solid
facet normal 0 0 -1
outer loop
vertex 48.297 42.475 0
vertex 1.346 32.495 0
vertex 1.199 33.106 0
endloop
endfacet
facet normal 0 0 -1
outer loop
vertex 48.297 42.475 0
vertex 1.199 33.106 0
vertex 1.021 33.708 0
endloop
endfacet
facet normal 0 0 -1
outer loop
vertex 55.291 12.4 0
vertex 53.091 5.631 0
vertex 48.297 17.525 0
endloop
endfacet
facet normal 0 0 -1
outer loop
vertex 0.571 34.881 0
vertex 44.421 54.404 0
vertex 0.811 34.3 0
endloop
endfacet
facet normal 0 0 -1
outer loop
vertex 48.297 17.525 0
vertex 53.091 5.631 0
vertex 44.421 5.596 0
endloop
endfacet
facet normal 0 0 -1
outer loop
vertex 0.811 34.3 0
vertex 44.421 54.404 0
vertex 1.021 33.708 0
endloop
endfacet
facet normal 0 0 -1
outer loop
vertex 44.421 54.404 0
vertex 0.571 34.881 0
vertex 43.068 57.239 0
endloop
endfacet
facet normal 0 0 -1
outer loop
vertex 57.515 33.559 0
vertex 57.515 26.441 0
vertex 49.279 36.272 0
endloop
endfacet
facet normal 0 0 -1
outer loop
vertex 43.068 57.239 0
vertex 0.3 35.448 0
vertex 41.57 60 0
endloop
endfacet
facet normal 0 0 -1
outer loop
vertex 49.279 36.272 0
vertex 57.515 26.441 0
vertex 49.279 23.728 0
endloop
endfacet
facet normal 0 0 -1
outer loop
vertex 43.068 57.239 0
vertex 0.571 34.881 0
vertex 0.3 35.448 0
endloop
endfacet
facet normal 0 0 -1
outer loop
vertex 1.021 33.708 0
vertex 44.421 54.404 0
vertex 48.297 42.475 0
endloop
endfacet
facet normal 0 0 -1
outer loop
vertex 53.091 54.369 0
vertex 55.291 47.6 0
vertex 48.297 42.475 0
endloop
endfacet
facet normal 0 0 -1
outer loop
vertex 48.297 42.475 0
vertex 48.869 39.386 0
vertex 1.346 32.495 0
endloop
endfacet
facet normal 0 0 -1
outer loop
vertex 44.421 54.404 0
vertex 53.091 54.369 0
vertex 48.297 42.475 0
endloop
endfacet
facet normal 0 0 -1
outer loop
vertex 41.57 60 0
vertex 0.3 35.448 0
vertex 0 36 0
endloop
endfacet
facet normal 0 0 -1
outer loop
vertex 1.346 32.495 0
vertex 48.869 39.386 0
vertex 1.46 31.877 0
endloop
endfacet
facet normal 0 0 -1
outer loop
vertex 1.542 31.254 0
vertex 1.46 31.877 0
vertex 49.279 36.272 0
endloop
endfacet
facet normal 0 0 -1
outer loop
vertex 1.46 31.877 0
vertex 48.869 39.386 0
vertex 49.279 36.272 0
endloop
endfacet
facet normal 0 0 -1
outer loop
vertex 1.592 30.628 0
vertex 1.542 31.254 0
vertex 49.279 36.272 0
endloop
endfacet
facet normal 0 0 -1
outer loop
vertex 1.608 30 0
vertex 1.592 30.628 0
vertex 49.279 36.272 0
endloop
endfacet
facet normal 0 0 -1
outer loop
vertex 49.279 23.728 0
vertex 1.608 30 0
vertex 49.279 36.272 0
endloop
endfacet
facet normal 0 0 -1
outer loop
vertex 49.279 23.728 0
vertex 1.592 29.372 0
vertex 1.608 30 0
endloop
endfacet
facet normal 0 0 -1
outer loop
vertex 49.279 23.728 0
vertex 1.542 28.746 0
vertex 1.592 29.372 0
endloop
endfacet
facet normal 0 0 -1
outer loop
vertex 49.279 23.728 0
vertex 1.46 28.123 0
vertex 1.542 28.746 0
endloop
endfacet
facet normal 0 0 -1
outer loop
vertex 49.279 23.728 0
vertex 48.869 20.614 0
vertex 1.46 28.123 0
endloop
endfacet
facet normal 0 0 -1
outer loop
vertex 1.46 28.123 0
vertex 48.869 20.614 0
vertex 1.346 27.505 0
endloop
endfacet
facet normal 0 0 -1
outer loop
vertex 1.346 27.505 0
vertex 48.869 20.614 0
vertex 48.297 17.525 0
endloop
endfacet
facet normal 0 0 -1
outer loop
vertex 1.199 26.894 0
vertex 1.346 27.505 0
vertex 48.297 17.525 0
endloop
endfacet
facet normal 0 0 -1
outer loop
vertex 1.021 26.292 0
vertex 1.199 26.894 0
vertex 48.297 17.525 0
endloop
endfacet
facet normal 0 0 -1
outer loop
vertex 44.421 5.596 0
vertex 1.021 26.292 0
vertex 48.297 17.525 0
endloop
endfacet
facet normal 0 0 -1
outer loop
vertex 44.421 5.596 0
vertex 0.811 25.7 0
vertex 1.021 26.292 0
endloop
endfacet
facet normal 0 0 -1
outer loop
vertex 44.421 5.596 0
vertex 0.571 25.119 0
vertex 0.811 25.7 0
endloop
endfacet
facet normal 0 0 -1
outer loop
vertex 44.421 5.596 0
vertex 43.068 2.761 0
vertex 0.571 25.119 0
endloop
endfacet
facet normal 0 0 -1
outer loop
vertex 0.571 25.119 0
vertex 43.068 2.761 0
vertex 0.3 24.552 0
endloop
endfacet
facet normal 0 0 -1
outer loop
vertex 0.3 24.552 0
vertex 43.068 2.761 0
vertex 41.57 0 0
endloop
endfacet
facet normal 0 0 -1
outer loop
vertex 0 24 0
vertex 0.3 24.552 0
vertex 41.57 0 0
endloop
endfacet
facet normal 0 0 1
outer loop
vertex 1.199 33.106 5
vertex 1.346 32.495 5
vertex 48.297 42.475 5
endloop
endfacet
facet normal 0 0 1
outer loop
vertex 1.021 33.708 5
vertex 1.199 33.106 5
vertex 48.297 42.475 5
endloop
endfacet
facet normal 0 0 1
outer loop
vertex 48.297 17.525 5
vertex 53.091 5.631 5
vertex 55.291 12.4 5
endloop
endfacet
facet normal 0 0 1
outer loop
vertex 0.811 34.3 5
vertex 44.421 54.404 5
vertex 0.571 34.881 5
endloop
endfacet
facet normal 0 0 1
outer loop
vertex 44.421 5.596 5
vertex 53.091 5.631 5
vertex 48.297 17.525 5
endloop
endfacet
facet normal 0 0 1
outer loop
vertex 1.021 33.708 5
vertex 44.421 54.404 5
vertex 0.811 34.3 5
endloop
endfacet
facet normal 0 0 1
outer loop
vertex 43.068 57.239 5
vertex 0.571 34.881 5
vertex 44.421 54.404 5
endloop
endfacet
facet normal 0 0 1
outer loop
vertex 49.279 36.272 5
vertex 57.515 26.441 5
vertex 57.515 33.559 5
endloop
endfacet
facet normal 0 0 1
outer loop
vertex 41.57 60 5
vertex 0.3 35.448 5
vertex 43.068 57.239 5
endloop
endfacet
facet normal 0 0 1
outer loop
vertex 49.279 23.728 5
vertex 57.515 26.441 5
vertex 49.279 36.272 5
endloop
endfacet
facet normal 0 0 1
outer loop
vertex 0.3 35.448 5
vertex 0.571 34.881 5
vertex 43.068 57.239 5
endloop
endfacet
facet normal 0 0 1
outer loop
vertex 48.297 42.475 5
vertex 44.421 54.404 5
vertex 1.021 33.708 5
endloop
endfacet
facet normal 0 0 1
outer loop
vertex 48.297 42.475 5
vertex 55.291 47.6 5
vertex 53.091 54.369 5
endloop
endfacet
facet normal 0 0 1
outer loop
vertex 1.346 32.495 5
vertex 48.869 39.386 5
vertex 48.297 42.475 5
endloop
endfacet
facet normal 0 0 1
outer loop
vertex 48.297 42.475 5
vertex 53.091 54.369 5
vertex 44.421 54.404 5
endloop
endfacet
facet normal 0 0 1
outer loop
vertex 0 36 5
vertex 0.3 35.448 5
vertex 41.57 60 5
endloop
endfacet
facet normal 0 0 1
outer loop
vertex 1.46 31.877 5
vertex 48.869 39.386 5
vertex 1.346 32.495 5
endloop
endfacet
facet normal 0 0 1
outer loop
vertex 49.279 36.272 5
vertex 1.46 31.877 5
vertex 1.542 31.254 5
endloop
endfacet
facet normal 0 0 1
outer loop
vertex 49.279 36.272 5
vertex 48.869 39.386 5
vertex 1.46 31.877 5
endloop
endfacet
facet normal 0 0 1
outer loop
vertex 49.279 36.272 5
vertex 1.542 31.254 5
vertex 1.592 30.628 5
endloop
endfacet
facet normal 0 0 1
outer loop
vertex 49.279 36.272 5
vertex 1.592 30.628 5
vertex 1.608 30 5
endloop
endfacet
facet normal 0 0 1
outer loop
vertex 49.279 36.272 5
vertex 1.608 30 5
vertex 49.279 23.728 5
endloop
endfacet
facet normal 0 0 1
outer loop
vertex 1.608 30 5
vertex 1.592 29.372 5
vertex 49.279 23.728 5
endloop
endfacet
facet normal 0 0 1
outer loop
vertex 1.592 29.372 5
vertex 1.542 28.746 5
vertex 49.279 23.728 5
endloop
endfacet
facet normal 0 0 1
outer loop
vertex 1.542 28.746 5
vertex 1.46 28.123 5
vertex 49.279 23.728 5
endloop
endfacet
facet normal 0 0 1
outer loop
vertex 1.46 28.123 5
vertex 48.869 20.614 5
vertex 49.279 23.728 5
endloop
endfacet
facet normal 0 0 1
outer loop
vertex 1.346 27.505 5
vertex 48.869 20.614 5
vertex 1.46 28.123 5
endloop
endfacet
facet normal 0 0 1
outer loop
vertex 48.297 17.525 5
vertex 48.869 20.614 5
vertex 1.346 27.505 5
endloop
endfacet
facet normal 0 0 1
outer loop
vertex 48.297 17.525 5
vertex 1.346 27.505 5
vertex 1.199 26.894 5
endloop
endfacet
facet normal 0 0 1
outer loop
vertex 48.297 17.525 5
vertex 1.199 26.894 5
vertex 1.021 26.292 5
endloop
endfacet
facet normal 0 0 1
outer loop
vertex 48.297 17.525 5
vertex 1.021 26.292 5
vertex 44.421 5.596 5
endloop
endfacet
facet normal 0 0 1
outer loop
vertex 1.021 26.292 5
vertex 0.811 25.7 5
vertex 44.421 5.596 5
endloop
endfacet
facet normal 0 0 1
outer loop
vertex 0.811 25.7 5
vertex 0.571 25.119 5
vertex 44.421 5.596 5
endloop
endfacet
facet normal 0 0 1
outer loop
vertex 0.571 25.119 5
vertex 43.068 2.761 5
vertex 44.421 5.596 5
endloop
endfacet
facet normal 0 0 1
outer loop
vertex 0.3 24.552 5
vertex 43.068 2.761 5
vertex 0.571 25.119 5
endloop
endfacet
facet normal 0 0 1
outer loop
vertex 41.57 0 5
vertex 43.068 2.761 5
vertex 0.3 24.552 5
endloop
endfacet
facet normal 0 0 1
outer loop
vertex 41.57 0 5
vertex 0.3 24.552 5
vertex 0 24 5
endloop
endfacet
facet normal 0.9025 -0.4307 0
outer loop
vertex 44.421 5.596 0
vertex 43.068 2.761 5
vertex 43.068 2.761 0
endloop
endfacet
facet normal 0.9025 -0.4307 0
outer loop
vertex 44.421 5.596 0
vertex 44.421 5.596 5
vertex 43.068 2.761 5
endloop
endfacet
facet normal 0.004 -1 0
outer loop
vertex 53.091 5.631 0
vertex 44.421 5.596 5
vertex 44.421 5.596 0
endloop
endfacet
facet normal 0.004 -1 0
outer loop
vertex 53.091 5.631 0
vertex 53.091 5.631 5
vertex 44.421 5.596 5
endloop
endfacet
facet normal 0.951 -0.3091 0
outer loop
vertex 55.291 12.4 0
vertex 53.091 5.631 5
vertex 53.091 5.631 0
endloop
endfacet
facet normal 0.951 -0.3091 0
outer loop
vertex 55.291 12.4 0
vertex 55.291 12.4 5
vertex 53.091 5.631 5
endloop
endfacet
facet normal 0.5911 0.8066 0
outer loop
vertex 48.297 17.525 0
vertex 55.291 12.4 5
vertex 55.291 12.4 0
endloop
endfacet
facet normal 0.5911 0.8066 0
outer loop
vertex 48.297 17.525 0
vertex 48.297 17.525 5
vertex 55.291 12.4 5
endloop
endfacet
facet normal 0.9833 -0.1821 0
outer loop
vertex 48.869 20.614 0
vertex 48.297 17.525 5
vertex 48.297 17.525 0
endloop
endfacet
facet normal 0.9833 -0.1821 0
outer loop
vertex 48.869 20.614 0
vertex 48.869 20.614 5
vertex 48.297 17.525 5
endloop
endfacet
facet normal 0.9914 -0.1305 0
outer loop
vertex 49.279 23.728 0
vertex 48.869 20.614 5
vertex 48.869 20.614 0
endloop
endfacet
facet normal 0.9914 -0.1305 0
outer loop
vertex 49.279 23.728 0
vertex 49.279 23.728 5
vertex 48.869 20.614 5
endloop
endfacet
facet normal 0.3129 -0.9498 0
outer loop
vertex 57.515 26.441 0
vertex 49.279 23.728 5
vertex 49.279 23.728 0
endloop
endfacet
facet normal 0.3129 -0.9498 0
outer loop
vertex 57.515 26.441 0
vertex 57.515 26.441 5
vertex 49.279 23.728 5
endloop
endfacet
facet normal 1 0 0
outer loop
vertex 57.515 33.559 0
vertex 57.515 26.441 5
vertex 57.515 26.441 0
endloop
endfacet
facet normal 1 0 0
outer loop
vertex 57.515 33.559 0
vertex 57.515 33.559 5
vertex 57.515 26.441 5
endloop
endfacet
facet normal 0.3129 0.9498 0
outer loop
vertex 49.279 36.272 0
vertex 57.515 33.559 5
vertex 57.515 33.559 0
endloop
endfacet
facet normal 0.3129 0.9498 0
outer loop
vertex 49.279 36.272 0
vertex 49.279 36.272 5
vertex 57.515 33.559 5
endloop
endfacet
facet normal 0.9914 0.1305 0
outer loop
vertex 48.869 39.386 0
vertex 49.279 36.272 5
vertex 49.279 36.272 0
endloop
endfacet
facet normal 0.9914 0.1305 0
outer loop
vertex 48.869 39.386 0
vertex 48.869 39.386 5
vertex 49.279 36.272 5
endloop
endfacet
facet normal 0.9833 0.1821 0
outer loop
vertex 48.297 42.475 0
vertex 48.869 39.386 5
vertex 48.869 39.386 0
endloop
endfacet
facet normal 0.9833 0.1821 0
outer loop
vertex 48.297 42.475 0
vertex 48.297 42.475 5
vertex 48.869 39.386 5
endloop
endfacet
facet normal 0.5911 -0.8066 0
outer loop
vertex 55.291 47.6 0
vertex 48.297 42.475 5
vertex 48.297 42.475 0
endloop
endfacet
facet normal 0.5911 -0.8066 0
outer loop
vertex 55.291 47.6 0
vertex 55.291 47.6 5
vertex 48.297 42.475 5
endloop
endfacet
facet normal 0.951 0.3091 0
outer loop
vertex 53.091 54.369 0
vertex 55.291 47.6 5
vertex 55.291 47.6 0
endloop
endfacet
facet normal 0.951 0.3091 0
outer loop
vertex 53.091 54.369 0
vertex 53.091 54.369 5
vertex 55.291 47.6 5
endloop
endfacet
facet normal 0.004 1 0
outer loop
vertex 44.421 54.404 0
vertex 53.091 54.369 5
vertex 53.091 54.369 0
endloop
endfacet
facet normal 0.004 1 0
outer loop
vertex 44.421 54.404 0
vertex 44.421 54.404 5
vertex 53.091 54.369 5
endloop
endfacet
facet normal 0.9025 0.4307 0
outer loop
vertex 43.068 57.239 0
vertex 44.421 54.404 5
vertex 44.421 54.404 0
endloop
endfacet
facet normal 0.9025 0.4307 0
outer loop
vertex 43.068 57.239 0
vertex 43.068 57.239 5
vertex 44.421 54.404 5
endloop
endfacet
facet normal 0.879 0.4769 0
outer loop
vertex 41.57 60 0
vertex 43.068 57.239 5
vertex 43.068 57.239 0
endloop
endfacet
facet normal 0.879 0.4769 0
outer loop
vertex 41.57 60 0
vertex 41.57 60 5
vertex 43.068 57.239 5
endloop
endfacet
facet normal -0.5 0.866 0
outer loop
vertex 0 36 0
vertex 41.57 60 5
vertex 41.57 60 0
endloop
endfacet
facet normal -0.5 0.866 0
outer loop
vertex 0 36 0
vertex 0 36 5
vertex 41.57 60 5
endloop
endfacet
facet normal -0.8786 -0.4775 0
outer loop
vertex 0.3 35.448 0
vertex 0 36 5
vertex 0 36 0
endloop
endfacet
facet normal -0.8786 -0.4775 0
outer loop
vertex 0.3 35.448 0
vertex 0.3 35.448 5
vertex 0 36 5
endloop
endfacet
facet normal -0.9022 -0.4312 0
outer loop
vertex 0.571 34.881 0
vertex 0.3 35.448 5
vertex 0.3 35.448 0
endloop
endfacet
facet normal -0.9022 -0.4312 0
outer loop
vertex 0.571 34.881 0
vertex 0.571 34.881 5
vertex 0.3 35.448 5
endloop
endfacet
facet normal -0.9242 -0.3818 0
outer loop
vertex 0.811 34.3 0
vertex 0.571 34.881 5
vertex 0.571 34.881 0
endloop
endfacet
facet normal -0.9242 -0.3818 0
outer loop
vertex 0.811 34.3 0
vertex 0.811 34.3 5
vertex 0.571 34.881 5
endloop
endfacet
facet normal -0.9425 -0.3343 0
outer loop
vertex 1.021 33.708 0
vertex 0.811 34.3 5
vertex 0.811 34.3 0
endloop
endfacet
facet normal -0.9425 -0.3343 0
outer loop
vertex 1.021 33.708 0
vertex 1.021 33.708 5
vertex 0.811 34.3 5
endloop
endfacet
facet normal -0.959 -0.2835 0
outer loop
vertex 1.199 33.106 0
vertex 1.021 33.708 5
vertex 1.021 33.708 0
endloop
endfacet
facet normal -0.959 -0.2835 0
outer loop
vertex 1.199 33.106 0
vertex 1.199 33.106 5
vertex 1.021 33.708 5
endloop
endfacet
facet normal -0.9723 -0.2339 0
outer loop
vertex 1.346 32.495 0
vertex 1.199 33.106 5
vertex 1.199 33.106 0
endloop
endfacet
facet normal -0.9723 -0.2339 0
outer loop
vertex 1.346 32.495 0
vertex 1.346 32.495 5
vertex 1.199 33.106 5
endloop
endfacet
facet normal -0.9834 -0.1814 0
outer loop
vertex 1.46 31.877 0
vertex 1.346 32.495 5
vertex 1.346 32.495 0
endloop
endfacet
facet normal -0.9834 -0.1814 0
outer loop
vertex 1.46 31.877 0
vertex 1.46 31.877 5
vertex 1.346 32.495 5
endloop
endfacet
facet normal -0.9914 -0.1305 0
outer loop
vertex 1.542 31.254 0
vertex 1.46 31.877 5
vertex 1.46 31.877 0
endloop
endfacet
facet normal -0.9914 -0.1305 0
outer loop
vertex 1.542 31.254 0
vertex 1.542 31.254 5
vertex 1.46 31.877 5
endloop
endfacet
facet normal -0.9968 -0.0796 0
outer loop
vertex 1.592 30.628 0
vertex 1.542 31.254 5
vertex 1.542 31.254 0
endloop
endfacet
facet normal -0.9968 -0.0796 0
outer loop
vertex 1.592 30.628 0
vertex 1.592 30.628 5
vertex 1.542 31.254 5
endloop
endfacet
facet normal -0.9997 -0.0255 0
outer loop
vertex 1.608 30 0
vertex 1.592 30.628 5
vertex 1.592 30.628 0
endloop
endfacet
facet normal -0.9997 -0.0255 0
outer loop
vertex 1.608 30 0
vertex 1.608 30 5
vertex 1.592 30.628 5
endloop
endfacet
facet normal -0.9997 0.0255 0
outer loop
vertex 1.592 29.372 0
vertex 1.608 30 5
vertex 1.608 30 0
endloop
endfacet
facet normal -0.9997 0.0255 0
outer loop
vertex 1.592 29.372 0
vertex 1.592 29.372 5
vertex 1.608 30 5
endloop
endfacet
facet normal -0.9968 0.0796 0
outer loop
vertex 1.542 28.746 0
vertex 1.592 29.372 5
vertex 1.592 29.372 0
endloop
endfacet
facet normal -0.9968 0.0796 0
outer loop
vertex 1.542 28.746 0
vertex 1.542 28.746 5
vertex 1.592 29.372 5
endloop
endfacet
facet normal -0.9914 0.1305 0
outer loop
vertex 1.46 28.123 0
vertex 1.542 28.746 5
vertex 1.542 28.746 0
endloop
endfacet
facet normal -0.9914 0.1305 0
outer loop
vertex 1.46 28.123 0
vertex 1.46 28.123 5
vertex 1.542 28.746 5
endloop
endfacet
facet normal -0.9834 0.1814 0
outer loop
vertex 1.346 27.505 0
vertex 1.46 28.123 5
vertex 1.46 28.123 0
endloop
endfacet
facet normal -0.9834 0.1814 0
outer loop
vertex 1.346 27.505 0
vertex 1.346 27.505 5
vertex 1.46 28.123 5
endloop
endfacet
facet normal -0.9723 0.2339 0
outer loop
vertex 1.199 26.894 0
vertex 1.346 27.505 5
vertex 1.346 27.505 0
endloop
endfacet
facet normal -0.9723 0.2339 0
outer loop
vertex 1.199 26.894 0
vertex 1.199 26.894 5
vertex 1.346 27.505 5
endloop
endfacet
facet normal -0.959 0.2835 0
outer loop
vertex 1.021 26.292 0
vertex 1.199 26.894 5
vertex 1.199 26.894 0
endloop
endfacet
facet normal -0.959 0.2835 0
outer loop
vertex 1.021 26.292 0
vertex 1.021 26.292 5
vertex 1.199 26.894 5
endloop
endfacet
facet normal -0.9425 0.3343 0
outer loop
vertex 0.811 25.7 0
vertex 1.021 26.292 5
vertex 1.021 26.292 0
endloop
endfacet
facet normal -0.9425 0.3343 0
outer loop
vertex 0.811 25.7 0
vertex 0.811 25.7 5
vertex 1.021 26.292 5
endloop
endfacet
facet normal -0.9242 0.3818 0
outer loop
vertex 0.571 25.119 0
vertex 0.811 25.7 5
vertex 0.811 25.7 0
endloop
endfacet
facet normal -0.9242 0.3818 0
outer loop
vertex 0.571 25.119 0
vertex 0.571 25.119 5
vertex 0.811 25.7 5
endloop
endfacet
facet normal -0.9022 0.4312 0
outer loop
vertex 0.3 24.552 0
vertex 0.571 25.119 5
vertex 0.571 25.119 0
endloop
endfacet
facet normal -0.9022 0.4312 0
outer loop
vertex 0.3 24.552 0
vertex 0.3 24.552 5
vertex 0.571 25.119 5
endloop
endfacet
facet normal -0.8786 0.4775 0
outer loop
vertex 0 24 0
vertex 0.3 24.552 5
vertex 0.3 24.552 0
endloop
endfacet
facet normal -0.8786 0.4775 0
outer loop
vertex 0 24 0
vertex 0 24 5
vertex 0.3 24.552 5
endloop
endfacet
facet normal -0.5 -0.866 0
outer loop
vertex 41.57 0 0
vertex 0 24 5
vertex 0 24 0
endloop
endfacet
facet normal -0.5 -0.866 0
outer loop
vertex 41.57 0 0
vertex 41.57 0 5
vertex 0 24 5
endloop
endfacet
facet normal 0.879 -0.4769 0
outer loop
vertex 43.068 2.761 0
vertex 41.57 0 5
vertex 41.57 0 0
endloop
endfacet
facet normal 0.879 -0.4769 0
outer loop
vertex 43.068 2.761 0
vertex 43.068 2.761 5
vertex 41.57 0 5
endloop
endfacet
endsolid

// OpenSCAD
$fn = 32;

// ----------------------------------------------------------------------
// Gear sector: 3 teeth on 60 degrees
// ----------------------------------------------------------------------

// --- parameters (mm) ---
sector_angle = 60;        // sector angle, degrees
root_r = 60;              // root circle radius
tooth_h = 8;              // tooth height over the root circle
teeth = 3;                // number of teeth on the sector
hub_r = 12;               // hub bore radius
plate_t = 5;              // sector thickness, Z
arc_step = 3;             // sampling step of the root/hub arcs, degrees

tip_r = root_r + tooth_h;  // tip circle radius

profile = [[41.57, 0], [43.068, 2.761], [44.421, 5.596], [53.091, 5.631], [55.291, 12.4], [48.297, 17.525], [48.869, 20.614], [49.279, 23.728], [57.515, 26.441], [57.515, 33.559], [49.279, 36.272], [48.869, 39.386], [48.297, 42.475], [55.291, 47.6], [53.091, 54.369], [44.421, 54.404], [43.068, 57.239], [41.57, 60], [0, 36], [0.3, 35.448], [0.571, 34.881], [0.811, 34.3], [1.021, 33.708], [1.199, 33.106], [1.346, 32.495], [1.46, 31.877], [1.542, 31.254], [1.592, 30.628], [1.608, 30], [1.592, 29.372], [1.542, 28.746], [1.46, 28.123], [1.346, 27.505], [1.199, 26.894], [1.021, 26.292], [0.811, 25.7], [0.571, 25.119], [0.3, 24.552], [0, 24]];  // primary outline, 39 points, counter clockwise

// --- the one profile operation ---
linear_extrude(height = plate_t) polygon(points = profile);
